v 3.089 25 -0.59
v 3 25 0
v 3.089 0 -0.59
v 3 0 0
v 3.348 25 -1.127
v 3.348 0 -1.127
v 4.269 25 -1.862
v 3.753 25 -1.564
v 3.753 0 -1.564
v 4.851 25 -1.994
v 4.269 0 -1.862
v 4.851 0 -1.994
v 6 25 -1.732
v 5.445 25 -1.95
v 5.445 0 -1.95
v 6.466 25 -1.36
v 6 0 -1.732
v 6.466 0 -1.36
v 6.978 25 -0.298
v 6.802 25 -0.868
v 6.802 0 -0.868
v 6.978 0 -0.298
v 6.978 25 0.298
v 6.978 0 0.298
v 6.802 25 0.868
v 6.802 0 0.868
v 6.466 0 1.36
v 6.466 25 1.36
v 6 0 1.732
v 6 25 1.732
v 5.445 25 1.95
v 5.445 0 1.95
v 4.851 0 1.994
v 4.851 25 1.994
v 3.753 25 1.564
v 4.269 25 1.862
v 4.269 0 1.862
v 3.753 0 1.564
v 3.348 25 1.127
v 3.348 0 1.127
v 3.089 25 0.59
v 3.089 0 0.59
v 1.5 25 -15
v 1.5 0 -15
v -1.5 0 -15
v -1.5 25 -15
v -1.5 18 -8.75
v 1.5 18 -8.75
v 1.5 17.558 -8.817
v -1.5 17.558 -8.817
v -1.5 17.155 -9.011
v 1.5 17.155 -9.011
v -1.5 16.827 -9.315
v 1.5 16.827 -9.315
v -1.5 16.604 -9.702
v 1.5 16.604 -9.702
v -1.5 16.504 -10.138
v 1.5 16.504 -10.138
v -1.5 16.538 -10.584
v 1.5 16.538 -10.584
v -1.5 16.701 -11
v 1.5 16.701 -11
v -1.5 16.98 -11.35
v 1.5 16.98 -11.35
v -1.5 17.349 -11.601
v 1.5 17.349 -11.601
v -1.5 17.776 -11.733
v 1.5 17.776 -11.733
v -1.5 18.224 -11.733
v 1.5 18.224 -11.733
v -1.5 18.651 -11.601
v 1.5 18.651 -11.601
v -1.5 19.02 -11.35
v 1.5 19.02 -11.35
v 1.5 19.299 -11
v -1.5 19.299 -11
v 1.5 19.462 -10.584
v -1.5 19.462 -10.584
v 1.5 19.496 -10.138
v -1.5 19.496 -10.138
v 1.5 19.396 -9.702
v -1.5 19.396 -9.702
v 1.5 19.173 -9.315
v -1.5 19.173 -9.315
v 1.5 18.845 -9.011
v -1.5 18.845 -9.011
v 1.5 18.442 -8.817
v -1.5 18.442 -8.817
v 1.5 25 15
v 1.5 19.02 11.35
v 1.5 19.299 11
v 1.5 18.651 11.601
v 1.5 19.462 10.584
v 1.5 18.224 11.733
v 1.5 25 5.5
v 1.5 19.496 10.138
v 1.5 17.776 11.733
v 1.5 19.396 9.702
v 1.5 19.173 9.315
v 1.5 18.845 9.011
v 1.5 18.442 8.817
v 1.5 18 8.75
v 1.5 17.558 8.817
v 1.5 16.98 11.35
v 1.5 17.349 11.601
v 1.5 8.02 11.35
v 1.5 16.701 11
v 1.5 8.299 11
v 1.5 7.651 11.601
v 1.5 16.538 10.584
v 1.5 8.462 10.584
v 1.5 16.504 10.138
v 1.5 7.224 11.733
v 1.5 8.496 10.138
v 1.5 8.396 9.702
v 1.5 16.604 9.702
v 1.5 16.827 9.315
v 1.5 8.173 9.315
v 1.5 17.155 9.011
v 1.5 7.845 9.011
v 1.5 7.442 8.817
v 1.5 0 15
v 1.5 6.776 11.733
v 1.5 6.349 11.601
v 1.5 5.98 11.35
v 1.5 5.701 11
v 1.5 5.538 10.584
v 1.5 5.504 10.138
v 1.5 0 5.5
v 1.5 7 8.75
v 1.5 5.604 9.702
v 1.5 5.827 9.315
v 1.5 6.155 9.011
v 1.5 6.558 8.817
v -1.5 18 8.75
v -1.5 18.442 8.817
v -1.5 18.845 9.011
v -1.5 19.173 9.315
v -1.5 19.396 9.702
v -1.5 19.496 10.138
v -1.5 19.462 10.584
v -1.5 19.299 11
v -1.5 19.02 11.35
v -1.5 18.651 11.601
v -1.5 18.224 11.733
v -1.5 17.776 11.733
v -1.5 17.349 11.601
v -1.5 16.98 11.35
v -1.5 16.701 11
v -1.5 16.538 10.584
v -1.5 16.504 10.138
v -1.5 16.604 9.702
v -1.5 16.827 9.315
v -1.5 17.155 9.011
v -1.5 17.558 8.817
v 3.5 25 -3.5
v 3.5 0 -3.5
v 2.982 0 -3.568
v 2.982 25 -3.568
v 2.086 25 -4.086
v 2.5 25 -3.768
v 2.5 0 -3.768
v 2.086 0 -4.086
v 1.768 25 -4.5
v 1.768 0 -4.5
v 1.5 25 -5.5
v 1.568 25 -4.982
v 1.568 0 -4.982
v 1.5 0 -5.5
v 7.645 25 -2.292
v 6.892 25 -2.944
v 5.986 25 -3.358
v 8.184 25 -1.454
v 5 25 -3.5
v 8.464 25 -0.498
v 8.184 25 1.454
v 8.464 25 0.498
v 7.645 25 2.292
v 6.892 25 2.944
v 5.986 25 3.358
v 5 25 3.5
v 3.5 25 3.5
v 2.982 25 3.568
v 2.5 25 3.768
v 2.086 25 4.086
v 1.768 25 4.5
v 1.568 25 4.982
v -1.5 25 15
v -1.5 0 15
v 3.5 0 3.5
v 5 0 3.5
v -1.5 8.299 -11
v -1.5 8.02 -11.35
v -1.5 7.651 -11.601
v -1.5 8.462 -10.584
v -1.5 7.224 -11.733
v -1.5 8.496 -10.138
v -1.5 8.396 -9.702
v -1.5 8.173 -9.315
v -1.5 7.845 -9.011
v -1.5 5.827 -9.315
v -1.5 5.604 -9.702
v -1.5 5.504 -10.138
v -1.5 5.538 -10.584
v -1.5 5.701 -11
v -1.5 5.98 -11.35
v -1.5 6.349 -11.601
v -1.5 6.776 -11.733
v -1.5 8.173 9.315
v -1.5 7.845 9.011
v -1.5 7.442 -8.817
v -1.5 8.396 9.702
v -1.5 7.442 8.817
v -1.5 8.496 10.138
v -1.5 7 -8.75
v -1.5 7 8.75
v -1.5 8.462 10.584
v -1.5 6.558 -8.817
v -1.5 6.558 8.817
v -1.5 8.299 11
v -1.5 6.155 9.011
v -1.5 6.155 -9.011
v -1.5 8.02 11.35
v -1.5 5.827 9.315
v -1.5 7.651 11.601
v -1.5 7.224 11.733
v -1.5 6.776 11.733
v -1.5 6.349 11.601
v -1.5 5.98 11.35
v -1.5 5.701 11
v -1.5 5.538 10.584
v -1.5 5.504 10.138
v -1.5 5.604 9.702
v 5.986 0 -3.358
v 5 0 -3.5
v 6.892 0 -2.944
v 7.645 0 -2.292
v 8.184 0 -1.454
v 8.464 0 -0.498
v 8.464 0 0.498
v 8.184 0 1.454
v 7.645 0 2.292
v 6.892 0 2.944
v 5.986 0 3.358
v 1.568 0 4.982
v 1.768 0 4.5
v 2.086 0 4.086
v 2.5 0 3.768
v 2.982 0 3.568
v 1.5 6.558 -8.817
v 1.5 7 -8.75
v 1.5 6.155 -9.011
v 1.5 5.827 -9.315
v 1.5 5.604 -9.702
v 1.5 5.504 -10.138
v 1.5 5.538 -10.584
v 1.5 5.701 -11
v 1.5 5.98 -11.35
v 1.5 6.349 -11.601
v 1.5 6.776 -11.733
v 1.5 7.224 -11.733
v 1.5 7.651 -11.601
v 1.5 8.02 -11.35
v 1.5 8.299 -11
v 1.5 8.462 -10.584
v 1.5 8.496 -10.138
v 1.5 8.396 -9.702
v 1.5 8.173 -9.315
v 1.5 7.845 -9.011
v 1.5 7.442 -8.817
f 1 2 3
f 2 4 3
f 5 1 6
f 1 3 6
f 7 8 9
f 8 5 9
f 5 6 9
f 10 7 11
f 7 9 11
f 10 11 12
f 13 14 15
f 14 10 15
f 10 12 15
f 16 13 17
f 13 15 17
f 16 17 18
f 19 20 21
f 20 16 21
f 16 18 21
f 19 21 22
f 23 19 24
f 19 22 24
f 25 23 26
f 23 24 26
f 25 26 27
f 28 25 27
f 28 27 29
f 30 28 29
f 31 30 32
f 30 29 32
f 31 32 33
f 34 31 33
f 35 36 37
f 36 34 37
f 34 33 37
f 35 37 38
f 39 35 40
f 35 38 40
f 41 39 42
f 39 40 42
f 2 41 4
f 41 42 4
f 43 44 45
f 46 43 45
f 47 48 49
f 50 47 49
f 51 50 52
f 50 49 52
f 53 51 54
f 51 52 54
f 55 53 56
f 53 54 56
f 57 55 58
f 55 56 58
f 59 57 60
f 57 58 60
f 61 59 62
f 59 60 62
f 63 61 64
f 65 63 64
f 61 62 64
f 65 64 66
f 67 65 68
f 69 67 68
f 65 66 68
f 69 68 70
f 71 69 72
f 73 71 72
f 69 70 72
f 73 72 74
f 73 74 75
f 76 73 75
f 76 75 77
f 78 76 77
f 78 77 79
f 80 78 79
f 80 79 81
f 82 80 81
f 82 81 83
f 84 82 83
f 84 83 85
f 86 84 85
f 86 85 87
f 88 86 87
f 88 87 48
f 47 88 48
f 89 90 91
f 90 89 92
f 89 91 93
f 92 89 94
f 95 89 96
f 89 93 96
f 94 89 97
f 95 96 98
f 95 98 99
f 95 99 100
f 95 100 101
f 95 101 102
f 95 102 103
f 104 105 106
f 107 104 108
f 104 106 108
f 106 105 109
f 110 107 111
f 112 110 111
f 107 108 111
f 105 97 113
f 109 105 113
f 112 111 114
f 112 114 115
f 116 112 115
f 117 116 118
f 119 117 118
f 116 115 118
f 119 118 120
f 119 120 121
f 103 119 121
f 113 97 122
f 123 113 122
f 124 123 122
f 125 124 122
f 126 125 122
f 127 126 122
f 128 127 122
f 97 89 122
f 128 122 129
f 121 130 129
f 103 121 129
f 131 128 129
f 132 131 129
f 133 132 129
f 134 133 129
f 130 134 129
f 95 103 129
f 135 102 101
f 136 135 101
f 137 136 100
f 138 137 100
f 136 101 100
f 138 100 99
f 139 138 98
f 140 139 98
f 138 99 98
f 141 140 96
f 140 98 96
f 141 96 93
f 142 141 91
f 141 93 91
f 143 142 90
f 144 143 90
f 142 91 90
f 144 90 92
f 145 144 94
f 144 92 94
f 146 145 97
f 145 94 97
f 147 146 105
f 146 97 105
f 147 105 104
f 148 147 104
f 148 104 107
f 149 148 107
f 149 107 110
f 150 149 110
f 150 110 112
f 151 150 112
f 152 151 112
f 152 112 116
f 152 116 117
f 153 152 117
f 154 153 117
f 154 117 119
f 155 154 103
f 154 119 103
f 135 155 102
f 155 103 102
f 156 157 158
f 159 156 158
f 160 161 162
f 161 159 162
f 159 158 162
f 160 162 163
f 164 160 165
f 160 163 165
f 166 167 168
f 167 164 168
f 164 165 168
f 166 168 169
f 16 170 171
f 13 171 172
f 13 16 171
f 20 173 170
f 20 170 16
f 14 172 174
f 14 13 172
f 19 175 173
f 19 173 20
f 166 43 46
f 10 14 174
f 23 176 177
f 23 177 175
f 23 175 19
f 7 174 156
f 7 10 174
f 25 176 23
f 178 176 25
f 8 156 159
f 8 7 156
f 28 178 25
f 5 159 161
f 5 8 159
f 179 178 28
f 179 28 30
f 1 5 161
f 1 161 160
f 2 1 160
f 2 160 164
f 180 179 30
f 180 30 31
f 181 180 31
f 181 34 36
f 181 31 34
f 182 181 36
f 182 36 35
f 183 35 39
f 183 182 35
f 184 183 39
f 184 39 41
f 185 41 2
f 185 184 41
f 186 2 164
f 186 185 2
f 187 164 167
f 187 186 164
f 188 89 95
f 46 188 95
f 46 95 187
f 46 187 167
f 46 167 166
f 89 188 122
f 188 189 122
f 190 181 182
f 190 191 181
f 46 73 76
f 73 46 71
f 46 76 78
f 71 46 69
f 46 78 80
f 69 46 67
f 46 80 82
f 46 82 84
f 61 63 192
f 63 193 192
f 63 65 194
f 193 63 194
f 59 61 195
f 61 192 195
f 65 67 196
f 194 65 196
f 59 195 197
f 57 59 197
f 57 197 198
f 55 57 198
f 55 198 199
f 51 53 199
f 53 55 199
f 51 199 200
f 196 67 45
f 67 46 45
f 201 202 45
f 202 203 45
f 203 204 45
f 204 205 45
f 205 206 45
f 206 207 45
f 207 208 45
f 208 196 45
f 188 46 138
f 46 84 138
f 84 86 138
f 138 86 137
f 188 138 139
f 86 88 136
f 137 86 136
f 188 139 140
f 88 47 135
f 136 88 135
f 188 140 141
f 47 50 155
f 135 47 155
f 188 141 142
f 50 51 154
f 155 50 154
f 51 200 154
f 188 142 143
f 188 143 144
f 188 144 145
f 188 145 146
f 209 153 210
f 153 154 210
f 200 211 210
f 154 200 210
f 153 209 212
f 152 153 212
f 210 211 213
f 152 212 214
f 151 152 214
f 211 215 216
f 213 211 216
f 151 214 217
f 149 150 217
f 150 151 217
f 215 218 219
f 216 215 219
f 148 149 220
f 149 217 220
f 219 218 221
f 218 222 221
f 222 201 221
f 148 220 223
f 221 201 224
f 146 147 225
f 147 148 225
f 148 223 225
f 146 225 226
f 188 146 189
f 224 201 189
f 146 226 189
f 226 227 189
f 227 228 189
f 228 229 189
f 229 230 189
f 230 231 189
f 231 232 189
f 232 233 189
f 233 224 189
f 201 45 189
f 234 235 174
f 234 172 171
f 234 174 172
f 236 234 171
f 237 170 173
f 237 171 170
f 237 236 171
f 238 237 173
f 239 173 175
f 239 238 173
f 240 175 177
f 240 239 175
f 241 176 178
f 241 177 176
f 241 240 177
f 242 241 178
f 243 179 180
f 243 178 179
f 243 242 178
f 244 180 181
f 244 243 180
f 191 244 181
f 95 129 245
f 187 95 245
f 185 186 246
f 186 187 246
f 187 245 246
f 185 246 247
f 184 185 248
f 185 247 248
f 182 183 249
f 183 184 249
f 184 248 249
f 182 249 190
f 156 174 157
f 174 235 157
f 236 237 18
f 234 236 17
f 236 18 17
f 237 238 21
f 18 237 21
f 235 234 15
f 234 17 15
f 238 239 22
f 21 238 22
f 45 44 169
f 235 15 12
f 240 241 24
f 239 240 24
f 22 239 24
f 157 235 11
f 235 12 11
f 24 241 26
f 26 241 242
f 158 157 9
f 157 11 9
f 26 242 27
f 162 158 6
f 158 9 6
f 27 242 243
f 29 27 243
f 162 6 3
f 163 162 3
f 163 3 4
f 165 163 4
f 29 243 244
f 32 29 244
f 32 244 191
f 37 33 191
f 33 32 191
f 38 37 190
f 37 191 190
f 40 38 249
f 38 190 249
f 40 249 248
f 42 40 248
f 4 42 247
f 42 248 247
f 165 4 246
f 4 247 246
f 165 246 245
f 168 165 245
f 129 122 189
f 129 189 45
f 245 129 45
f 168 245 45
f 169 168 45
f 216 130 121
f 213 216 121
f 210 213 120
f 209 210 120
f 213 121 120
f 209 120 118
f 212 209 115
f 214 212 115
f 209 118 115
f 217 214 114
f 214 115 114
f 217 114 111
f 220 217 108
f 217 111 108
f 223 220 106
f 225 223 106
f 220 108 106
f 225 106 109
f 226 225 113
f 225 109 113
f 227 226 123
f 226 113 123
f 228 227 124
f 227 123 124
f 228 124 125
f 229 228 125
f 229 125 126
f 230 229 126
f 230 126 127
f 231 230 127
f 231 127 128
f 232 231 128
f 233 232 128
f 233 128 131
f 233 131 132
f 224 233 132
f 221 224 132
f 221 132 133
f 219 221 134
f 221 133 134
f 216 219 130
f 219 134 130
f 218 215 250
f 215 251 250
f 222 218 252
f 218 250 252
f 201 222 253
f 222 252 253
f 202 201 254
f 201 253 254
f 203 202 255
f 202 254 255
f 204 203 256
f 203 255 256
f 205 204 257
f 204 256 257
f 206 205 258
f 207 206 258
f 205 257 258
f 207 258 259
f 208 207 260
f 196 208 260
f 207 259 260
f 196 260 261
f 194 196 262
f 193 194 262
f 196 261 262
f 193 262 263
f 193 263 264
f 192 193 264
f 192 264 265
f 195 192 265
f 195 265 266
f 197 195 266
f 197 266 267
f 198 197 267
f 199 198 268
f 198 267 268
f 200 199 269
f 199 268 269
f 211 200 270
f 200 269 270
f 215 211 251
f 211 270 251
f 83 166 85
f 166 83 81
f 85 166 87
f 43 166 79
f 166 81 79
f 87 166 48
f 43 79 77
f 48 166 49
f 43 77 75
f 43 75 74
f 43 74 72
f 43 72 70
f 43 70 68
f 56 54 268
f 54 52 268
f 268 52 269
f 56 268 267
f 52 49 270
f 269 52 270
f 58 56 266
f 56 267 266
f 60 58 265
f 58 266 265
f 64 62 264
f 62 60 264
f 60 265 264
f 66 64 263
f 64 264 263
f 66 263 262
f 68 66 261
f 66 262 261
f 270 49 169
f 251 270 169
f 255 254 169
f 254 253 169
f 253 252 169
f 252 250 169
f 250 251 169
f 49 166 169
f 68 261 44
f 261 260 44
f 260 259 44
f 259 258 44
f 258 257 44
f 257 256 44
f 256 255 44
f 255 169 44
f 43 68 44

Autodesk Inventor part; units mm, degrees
ref_plane "YZ Plane" through (0, 0, 0) normal (1, 0, 0) x (0, 1, 0)
ref_plane "XZ Plane" through (0, 0, 0) normal (0, 1, 0) x (-1, 0, 0)
ref_plane "XY Plane" through (0, 0, 0) normal (0, 0, 1) x (1, 0, 0)
sketch "Sketch1" plane through (0, 0, 0) normal (0, 1, 0) x (-1, 0, 0)
  line L0 (1.5, 15) -> (-1.5, 15)
  line L1 (-1.5, -15) -> (1.5, -15)
  line L2 (1.5, -15) -> (1.5, 15)
  line L3 (1.5, 15) -> (-1.5, -15) construction
  line L4 (-1.5, 15) -> (1.5, -15) construction
  arc A0 (-5, 3.5) -> (-5, -3.5) centre (-5, 0) ccw
  circle A1 centre (-5, 0) radius 2
  line L5 (-5, -3.5) -> (-3.5, -3.5)
  line L6 (-5, 3.5) -> (-3.5, 3.5)
  line L7 (-1.5, 15) -> (-1.5, 5.5)
  line L8 (-1.5, -5.5) -> (-1.5, -15)
  arc A2 (-3.5, 3.5) -> (-1.5, 5.5) centre (-3.5, 5.5) ccw
  arc A3 (-1.5, -5.5) -> (-3.5, -3.5) centre (-3.5, -5.5) ccw
  point P0 (0, 0)
  dimension "d0" = 3
  dimension "d1" = 30
  dimension "d2" = 7
  dimension "d3" = 4
  dimension "d4" = 2
extrude "Extrusion1" add sketch "Sketch1" along normal blind 25
sketch "Sketch2" plane through (1.5, 0, 15) normal (1, 0, 0) x (0, 0, -1)
  circle A0 centre (4.75, 18) radius 1.5
  circle A1 centre (4.75, 7) radius 1.5
  line L0 (0, 0) -> (0, 25) projected
  line L1 (0, 25) -> (9.5, 25) projected
  line L2 (0, 0) -> (9.5, 0) projected
  point P0 (15, 0)
  dimension "d7" = 3
  dimension "d8" = 3
  dimension "d9" = 4.75
  dimension "d10" = 4.75
  dimension "d11" = 7
  dimension "d15" = 7
extrude "Extrusion2" cut sketch "Sketch2" against normal blind 25
mirror "Mirror1" about plane through (0, 0, 0) normal (0, 0, 1) of "Extrusion2"
properties part number "joint_female"
